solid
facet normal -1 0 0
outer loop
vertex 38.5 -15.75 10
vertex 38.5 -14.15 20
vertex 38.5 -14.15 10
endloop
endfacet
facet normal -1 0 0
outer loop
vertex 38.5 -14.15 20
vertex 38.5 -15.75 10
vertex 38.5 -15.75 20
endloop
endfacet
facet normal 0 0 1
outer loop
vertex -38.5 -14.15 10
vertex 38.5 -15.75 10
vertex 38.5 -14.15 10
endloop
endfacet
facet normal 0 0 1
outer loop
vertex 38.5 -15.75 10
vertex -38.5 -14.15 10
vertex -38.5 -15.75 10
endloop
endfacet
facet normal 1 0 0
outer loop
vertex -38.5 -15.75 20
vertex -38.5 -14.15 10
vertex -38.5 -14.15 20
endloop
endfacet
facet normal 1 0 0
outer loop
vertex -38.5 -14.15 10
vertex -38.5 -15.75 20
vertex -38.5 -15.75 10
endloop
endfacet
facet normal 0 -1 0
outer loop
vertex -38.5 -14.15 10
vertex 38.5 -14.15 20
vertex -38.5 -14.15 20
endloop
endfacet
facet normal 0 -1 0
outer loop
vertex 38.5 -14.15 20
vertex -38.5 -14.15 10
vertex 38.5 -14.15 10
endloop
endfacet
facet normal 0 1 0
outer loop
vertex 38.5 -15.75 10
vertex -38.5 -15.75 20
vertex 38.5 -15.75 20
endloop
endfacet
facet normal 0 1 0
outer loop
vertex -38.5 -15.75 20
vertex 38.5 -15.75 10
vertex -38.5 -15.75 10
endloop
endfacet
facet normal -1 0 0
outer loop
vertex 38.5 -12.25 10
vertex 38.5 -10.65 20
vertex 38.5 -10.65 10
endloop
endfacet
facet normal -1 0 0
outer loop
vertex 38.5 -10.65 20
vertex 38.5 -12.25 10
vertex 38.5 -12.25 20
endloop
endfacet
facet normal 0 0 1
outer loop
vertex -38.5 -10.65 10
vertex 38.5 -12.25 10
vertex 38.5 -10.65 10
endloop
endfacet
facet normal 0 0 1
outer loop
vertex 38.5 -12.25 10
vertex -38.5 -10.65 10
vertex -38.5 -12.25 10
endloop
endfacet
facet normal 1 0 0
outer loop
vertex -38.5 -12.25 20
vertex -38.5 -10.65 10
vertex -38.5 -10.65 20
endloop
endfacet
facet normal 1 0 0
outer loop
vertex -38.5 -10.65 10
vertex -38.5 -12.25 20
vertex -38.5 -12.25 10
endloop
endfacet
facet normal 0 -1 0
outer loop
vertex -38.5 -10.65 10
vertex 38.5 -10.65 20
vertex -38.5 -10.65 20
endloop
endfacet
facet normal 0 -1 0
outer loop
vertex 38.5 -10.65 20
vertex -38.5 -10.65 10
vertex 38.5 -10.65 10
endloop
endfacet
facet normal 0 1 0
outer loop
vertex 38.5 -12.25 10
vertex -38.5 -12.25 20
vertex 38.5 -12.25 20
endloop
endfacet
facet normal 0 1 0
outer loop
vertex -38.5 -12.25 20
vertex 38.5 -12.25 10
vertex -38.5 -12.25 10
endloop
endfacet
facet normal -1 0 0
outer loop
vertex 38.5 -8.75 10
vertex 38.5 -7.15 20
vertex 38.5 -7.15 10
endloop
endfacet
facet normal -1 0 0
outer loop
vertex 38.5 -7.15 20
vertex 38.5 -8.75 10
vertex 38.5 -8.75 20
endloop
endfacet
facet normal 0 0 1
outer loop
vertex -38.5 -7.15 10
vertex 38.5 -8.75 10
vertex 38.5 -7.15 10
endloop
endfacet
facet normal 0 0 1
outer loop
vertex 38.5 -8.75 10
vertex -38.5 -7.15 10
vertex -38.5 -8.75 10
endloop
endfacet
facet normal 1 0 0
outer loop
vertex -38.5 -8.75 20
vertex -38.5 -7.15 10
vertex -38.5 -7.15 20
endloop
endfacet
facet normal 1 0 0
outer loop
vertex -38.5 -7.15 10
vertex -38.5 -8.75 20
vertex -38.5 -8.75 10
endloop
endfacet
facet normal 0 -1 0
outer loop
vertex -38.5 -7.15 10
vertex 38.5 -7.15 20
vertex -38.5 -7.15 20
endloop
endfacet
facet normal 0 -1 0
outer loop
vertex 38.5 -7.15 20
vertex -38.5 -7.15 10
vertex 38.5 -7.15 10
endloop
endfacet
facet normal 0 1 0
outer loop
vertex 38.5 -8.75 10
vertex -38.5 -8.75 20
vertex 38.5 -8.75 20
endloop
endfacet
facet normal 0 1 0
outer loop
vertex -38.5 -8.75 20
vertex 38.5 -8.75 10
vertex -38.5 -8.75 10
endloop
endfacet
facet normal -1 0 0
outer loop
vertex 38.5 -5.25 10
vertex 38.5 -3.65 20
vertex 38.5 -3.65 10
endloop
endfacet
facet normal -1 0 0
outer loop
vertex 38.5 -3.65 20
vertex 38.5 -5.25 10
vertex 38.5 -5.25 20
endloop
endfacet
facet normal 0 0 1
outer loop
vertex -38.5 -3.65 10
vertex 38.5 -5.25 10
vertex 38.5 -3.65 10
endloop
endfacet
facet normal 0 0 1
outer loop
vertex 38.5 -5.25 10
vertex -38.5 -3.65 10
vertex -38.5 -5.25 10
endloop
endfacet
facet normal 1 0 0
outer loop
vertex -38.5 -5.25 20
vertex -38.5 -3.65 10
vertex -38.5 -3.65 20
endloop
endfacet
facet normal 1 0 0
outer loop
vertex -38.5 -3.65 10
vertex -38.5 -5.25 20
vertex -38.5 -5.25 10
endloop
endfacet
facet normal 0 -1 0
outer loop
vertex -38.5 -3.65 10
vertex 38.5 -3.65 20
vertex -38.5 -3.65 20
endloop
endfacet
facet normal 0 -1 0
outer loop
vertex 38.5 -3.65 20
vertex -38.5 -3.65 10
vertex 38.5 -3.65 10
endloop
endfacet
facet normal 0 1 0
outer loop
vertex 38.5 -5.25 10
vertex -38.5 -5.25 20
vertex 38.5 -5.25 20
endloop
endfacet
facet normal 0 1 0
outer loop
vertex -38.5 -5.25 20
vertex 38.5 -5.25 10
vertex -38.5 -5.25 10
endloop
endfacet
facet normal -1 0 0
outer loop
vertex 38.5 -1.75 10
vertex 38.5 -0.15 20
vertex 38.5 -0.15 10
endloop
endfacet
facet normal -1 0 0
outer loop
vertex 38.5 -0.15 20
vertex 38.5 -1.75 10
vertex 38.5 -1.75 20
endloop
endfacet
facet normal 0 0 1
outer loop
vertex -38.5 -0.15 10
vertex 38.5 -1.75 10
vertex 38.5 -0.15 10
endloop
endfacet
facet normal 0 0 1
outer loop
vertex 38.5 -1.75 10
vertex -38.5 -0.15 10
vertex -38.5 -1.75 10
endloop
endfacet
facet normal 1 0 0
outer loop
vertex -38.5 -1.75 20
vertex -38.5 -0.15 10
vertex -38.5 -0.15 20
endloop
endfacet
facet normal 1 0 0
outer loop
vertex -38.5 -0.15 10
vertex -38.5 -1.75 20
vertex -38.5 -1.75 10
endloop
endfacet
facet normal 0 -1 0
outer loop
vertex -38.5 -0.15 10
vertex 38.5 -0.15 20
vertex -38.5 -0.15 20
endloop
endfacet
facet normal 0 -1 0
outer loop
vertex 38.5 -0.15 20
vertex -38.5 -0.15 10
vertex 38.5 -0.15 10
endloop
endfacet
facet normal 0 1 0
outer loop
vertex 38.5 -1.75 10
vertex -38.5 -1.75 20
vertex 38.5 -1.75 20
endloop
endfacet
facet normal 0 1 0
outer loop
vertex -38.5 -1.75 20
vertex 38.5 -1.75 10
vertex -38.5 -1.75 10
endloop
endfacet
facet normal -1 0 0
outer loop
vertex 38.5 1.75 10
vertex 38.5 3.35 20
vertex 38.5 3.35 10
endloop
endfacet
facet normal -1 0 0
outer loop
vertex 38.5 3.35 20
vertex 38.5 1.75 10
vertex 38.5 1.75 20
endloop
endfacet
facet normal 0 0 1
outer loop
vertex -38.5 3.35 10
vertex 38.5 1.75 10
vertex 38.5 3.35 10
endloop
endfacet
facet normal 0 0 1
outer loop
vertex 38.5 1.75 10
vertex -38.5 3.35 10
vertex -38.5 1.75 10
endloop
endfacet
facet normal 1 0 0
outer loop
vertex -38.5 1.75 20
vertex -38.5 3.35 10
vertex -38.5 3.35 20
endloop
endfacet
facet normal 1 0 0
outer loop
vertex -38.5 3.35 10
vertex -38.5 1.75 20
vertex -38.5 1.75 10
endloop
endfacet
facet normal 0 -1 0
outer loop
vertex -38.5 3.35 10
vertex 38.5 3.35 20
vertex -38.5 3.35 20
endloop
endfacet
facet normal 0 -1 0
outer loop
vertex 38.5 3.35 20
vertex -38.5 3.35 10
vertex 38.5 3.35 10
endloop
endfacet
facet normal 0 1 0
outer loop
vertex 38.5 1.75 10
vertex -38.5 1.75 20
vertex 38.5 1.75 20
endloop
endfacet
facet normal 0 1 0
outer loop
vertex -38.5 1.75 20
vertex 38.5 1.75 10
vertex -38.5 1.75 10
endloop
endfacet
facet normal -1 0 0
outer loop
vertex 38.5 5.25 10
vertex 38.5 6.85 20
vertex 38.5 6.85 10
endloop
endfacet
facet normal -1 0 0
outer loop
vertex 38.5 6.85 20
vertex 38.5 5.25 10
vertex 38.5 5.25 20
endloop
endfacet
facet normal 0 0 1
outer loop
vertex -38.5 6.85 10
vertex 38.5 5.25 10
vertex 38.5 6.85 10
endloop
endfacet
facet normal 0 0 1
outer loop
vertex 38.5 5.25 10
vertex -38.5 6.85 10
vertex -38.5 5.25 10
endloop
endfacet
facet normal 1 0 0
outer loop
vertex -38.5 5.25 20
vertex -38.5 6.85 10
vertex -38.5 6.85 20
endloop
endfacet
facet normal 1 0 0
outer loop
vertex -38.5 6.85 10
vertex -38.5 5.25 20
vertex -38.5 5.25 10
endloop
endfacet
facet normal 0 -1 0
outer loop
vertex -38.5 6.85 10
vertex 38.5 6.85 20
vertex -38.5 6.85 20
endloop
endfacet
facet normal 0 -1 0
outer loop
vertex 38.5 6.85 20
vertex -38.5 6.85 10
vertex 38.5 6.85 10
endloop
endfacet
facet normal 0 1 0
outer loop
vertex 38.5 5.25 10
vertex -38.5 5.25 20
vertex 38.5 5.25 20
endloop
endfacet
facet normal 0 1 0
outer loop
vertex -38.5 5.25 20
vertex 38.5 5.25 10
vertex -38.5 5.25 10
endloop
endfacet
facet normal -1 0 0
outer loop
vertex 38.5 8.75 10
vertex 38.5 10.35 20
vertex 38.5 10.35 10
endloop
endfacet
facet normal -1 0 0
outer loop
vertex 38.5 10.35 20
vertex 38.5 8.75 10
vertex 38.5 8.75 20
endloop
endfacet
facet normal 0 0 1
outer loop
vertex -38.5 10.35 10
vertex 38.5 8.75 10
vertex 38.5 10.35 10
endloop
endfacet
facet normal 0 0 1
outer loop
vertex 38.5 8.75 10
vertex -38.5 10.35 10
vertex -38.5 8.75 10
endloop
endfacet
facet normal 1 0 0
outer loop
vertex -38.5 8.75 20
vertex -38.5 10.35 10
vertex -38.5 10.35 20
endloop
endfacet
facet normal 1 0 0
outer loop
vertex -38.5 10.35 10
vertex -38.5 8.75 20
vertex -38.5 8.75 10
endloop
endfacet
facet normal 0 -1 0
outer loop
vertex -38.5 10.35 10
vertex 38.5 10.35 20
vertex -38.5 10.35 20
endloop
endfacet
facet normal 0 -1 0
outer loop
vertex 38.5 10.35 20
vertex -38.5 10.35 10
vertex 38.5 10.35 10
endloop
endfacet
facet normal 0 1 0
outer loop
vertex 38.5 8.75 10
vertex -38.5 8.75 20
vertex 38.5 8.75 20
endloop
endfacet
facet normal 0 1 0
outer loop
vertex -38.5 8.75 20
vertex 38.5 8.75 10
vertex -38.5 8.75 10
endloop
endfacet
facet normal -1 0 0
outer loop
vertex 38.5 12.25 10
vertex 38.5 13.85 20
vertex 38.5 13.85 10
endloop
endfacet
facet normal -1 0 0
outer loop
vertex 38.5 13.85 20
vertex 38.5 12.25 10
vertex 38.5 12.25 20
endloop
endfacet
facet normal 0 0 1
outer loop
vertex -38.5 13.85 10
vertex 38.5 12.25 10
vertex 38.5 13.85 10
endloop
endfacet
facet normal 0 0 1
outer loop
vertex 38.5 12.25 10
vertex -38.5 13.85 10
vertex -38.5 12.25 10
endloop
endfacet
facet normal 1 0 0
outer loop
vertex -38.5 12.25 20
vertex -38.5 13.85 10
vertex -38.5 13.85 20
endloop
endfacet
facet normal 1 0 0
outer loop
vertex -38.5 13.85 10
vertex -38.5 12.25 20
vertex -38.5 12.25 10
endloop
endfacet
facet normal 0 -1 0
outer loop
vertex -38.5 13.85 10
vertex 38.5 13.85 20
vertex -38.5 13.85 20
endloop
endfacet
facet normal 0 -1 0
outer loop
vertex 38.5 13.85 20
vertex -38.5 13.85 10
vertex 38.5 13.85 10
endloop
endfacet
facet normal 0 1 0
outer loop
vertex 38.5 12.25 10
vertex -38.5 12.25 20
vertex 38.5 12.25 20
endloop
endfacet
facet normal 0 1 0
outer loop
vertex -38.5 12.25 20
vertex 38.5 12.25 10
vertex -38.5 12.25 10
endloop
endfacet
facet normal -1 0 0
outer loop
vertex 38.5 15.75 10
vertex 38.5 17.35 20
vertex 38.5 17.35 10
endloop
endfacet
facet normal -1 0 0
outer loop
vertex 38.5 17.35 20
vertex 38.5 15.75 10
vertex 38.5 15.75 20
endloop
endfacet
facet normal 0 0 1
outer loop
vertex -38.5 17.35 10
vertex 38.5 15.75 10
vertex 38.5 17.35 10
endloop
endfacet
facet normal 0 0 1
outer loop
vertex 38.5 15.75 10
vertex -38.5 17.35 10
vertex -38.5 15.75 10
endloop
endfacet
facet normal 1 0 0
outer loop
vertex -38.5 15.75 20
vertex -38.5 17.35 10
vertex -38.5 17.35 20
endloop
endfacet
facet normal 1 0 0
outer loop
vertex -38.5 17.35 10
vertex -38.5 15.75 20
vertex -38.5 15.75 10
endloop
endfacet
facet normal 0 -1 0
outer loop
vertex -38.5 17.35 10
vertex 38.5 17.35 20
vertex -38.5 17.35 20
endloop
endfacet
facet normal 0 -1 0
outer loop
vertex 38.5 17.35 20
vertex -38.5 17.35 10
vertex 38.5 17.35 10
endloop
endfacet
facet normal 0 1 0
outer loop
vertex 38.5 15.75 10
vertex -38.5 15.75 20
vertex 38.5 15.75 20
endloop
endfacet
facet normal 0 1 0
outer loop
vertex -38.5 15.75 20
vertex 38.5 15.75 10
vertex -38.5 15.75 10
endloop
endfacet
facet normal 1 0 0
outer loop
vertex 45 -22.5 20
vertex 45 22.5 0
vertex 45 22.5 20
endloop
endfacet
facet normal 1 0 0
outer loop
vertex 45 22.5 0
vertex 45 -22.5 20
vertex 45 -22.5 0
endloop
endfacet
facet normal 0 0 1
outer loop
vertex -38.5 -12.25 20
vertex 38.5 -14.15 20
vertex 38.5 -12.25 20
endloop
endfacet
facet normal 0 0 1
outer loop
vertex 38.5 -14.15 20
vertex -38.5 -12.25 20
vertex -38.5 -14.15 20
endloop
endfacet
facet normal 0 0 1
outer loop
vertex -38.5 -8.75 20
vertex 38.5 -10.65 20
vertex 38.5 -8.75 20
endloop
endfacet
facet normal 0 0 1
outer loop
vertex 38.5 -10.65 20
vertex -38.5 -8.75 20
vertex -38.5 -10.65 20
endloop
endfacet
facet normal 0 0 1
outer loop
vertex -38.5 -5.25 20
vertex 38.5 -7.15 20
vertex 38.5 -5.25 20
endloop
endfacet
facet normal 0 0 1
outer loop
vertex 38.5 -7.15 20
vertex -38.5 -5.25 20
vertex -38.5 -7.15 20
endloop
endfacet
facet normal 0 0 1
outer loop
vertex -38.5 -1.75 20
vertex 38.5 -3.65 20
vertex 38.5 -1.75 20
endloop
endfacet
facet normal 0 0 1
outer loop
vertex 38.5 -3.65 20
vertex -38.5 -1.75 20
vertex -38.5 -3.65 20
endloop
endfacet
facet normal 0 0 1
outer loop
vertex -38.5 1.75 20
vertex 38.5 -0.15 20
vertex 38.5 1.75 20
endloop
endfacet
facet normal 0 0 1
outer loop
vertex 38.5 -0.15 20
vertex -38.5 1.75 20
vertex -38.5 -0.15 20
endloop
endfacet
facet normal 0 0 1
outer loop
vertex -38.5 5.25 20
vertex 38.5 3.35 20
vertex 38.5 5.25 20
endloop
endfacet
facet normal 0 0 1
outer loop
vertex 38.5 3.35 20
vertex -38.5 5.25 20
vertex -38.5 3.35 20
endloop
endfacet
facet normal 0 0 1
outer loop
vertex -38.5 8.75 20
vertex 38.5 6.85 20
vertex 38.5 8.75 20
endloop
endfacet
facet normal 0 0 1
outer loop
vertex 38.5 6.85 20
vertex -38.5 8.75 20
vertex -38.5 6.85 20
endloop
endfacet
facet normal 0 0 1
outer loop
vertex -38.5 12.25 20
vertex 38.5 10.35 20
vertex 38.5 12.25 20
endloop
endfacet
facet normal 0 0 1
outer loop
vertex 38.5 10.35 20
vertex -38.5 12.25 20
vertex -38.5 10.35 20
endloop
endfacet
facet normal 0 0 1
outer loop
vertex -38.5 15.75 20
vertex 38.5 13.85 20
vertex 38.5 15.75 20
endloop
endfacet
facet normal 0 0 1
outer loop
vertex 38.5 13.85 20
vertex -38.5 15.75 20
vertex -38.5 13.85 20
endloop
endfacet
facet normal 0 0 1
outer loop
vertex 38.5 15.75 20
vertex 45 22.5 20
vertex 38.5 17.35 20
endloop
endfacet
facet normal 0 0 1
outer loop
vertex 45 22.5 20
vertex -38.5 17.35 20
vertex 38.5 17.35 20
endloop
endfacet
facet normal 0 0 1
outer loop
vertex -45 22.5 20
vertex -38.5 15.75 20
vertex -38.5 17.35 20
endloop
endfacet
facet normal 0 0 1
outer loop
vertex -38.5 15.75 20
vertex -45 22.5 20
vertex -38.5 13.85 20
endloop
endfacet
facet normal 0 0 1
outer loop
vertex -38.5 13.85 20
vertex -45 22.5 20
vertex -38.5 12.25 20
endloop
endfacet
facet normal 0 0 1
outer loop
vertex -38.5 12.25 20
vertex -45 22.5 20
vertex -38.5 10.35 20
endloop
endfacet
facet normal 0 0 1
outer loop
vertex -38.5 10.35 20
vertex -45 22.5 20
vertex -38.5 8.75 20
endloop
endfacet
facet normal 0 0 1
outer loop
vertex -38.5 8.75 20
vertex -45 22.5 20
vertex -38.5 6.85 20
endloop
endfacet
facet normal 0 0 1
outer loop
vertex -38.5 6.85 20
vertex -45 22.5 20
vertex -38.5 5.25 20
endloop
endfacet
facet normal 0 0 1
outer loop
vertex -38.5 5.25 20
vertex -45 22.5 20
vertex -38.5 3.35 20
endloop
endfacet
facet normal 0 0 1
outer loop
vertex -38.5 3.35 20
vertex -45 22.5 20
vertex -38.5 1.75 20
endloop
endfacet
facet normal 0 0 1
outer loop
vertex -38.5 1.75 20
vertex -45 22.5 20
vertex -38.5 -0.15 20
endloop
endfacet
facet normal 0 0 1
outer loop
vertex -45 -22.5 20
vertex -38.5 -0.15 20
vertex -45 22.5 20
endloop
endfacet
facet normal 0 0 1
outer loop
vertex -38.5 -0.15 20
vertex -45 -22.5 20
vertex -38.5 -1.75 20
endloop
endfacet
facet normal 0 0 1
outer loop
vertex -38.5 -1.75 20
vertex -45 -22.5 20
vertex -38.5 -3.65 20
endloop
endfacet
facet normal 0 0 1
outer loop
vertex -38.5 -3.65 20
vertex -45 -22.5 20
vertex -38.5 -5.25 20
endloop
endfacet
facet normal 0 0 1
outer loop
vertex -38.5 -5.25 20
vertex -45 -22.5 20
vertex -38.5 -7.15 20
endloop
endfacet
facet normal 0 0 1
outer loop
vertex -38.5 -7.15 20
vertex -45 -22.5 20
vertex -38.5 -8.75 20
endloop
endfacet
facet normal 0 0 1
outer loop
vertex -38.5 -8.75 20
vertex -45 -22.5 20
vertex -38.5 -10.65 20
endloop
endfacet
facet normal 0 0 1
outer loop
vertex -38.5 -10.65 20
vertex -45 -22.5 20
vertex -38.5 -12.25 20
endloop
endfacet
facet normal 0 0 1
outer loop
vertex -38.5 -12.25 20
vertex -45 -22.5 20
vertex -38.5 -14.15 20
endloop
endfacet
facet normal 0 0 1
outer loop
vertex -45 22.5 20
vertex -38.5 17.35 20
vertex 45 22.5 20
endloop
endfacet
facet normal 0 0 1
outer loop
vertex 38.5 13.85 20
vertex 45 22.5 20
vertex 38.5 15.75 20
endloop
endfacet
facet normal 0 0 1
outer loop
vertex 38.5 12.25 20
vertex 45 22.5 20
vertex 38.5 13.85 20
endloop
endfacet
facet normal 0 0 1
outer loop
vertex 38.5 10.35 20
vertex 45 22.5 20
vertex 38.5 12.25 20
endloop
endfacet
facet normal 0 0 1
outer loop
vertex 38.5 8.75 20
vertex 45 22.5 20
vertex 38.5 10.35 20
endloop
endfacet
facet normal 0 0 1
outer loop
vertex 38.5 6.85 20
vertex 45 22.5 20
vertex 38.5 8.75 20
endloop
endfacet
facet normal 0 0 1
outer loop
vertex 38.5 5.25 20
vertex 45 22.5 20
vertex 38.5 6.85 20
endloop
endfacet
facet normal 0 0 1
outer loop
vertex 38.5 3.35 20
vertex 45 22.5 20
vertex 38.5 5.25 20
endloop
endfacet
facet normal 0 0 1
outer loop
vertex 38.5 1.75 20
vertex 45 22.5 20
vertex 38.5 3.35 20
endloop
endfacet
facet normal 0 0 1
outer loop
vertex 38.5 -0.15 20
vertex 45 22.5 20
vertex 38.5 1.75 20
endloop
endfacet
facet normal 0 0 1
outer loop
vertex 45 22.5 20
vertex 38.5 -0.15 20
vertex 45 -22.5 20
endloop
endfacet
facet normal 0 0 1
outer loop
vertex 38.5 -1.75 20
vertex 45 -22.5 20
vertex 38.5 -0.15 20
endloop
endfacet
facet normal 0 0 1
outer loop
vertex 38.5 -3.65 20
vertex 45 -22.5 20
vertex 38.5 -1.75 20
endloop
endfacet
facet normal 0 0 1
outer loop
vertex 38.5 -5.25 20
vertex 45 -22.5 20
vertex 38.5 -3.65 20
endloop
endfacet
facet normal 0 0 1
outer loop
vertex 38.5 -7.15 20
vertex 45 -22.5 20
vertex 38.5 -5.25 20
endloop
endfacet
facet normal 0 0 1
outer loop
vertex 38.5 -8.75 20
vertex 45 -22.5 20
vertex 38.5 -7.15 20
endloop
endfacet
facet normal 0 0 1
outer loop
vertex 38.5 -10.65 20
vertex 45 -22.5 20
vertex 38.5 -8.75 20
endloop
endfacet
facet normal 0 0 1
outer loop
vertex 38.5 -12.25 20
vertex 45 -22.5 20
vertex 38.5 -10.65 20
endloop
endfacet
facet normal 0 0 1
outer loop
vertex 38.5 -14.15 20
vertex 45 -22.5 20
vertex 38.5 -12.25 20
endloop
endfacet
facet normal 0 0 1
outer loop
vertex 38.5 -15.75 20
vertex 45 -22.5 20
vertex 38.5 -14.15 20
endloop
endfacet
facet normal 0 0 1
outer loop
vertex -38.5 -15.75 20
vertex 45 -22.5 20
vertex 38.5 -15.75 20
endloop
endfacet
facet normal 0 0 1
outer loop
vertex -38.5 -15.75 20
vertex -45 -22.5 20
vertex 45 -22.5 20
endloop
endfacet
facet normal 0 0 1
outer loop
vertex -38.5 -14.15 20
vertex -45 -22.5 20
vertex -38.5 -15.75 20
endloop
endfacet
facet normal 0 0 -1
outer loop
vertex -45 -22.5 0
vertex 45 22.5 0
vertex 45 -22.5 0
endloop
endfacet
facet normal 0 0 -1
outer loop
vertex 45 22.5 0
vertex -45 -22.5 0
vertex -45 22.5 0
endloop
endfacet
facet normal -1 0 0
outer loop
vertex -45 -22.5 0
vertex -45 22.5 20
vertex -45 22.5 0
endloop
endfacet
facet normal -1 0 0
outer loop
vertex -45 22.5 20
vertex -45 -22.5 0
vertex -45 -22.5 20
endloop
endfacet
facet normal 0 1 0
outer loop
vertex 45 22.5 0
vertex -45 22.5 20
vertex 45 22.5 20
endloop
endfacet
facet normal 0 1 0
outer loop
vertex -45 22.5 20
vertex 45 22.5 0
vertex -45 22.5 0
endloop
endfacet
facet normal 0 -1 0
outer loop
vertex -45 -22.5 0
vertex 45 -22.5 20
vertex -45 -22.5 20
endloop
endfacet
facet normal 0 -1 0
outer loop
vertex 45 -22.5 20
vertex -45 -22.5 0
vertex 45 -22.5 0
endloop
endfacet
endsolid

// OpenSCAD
// Microscope slide drying rack
// Print orientation: base block on XY plane, slots open upward (+Z)

// ---------------- Parameters ----------------
block_len    = 90;    // base block length along X (mm)
block_wid    = 45;    // base block width along Y (mm)
block_h      = 20;    // base block height along Z (mm)

slot_count   = 10;    // number of slide slots
slot_len     = 77;    // slot length along X (mm)
slot_w       = 1.6;   // slot width along Y (mm)
slot_depth   = 10;    // slot depth into block from top face (mm)
slot_pitch   = 3.5;   // centre-to-centre slot spacing along Y (mm)

eps          = 0.5;   // cutter overshoot past top face (mm)

$fn = 64;

// ---------------- Model ----------------
difference() {
    // Base block, centred in X and Y
    translate([-block_len/2, -block_wid/2, 0])
        cube([block_len, block_wid, block_h]);

    // Parallel slots running along X, centred in X and Y
    for (i = [0 : slot_count - 1]) {
        y = (i - (slot_count - 1)/2) * slot_pitch;
        translate([-slot_len/2, y, block_h - slot_depth])
            cube([slot_len, slot_w, slot_depth + eps]);
    }
}
